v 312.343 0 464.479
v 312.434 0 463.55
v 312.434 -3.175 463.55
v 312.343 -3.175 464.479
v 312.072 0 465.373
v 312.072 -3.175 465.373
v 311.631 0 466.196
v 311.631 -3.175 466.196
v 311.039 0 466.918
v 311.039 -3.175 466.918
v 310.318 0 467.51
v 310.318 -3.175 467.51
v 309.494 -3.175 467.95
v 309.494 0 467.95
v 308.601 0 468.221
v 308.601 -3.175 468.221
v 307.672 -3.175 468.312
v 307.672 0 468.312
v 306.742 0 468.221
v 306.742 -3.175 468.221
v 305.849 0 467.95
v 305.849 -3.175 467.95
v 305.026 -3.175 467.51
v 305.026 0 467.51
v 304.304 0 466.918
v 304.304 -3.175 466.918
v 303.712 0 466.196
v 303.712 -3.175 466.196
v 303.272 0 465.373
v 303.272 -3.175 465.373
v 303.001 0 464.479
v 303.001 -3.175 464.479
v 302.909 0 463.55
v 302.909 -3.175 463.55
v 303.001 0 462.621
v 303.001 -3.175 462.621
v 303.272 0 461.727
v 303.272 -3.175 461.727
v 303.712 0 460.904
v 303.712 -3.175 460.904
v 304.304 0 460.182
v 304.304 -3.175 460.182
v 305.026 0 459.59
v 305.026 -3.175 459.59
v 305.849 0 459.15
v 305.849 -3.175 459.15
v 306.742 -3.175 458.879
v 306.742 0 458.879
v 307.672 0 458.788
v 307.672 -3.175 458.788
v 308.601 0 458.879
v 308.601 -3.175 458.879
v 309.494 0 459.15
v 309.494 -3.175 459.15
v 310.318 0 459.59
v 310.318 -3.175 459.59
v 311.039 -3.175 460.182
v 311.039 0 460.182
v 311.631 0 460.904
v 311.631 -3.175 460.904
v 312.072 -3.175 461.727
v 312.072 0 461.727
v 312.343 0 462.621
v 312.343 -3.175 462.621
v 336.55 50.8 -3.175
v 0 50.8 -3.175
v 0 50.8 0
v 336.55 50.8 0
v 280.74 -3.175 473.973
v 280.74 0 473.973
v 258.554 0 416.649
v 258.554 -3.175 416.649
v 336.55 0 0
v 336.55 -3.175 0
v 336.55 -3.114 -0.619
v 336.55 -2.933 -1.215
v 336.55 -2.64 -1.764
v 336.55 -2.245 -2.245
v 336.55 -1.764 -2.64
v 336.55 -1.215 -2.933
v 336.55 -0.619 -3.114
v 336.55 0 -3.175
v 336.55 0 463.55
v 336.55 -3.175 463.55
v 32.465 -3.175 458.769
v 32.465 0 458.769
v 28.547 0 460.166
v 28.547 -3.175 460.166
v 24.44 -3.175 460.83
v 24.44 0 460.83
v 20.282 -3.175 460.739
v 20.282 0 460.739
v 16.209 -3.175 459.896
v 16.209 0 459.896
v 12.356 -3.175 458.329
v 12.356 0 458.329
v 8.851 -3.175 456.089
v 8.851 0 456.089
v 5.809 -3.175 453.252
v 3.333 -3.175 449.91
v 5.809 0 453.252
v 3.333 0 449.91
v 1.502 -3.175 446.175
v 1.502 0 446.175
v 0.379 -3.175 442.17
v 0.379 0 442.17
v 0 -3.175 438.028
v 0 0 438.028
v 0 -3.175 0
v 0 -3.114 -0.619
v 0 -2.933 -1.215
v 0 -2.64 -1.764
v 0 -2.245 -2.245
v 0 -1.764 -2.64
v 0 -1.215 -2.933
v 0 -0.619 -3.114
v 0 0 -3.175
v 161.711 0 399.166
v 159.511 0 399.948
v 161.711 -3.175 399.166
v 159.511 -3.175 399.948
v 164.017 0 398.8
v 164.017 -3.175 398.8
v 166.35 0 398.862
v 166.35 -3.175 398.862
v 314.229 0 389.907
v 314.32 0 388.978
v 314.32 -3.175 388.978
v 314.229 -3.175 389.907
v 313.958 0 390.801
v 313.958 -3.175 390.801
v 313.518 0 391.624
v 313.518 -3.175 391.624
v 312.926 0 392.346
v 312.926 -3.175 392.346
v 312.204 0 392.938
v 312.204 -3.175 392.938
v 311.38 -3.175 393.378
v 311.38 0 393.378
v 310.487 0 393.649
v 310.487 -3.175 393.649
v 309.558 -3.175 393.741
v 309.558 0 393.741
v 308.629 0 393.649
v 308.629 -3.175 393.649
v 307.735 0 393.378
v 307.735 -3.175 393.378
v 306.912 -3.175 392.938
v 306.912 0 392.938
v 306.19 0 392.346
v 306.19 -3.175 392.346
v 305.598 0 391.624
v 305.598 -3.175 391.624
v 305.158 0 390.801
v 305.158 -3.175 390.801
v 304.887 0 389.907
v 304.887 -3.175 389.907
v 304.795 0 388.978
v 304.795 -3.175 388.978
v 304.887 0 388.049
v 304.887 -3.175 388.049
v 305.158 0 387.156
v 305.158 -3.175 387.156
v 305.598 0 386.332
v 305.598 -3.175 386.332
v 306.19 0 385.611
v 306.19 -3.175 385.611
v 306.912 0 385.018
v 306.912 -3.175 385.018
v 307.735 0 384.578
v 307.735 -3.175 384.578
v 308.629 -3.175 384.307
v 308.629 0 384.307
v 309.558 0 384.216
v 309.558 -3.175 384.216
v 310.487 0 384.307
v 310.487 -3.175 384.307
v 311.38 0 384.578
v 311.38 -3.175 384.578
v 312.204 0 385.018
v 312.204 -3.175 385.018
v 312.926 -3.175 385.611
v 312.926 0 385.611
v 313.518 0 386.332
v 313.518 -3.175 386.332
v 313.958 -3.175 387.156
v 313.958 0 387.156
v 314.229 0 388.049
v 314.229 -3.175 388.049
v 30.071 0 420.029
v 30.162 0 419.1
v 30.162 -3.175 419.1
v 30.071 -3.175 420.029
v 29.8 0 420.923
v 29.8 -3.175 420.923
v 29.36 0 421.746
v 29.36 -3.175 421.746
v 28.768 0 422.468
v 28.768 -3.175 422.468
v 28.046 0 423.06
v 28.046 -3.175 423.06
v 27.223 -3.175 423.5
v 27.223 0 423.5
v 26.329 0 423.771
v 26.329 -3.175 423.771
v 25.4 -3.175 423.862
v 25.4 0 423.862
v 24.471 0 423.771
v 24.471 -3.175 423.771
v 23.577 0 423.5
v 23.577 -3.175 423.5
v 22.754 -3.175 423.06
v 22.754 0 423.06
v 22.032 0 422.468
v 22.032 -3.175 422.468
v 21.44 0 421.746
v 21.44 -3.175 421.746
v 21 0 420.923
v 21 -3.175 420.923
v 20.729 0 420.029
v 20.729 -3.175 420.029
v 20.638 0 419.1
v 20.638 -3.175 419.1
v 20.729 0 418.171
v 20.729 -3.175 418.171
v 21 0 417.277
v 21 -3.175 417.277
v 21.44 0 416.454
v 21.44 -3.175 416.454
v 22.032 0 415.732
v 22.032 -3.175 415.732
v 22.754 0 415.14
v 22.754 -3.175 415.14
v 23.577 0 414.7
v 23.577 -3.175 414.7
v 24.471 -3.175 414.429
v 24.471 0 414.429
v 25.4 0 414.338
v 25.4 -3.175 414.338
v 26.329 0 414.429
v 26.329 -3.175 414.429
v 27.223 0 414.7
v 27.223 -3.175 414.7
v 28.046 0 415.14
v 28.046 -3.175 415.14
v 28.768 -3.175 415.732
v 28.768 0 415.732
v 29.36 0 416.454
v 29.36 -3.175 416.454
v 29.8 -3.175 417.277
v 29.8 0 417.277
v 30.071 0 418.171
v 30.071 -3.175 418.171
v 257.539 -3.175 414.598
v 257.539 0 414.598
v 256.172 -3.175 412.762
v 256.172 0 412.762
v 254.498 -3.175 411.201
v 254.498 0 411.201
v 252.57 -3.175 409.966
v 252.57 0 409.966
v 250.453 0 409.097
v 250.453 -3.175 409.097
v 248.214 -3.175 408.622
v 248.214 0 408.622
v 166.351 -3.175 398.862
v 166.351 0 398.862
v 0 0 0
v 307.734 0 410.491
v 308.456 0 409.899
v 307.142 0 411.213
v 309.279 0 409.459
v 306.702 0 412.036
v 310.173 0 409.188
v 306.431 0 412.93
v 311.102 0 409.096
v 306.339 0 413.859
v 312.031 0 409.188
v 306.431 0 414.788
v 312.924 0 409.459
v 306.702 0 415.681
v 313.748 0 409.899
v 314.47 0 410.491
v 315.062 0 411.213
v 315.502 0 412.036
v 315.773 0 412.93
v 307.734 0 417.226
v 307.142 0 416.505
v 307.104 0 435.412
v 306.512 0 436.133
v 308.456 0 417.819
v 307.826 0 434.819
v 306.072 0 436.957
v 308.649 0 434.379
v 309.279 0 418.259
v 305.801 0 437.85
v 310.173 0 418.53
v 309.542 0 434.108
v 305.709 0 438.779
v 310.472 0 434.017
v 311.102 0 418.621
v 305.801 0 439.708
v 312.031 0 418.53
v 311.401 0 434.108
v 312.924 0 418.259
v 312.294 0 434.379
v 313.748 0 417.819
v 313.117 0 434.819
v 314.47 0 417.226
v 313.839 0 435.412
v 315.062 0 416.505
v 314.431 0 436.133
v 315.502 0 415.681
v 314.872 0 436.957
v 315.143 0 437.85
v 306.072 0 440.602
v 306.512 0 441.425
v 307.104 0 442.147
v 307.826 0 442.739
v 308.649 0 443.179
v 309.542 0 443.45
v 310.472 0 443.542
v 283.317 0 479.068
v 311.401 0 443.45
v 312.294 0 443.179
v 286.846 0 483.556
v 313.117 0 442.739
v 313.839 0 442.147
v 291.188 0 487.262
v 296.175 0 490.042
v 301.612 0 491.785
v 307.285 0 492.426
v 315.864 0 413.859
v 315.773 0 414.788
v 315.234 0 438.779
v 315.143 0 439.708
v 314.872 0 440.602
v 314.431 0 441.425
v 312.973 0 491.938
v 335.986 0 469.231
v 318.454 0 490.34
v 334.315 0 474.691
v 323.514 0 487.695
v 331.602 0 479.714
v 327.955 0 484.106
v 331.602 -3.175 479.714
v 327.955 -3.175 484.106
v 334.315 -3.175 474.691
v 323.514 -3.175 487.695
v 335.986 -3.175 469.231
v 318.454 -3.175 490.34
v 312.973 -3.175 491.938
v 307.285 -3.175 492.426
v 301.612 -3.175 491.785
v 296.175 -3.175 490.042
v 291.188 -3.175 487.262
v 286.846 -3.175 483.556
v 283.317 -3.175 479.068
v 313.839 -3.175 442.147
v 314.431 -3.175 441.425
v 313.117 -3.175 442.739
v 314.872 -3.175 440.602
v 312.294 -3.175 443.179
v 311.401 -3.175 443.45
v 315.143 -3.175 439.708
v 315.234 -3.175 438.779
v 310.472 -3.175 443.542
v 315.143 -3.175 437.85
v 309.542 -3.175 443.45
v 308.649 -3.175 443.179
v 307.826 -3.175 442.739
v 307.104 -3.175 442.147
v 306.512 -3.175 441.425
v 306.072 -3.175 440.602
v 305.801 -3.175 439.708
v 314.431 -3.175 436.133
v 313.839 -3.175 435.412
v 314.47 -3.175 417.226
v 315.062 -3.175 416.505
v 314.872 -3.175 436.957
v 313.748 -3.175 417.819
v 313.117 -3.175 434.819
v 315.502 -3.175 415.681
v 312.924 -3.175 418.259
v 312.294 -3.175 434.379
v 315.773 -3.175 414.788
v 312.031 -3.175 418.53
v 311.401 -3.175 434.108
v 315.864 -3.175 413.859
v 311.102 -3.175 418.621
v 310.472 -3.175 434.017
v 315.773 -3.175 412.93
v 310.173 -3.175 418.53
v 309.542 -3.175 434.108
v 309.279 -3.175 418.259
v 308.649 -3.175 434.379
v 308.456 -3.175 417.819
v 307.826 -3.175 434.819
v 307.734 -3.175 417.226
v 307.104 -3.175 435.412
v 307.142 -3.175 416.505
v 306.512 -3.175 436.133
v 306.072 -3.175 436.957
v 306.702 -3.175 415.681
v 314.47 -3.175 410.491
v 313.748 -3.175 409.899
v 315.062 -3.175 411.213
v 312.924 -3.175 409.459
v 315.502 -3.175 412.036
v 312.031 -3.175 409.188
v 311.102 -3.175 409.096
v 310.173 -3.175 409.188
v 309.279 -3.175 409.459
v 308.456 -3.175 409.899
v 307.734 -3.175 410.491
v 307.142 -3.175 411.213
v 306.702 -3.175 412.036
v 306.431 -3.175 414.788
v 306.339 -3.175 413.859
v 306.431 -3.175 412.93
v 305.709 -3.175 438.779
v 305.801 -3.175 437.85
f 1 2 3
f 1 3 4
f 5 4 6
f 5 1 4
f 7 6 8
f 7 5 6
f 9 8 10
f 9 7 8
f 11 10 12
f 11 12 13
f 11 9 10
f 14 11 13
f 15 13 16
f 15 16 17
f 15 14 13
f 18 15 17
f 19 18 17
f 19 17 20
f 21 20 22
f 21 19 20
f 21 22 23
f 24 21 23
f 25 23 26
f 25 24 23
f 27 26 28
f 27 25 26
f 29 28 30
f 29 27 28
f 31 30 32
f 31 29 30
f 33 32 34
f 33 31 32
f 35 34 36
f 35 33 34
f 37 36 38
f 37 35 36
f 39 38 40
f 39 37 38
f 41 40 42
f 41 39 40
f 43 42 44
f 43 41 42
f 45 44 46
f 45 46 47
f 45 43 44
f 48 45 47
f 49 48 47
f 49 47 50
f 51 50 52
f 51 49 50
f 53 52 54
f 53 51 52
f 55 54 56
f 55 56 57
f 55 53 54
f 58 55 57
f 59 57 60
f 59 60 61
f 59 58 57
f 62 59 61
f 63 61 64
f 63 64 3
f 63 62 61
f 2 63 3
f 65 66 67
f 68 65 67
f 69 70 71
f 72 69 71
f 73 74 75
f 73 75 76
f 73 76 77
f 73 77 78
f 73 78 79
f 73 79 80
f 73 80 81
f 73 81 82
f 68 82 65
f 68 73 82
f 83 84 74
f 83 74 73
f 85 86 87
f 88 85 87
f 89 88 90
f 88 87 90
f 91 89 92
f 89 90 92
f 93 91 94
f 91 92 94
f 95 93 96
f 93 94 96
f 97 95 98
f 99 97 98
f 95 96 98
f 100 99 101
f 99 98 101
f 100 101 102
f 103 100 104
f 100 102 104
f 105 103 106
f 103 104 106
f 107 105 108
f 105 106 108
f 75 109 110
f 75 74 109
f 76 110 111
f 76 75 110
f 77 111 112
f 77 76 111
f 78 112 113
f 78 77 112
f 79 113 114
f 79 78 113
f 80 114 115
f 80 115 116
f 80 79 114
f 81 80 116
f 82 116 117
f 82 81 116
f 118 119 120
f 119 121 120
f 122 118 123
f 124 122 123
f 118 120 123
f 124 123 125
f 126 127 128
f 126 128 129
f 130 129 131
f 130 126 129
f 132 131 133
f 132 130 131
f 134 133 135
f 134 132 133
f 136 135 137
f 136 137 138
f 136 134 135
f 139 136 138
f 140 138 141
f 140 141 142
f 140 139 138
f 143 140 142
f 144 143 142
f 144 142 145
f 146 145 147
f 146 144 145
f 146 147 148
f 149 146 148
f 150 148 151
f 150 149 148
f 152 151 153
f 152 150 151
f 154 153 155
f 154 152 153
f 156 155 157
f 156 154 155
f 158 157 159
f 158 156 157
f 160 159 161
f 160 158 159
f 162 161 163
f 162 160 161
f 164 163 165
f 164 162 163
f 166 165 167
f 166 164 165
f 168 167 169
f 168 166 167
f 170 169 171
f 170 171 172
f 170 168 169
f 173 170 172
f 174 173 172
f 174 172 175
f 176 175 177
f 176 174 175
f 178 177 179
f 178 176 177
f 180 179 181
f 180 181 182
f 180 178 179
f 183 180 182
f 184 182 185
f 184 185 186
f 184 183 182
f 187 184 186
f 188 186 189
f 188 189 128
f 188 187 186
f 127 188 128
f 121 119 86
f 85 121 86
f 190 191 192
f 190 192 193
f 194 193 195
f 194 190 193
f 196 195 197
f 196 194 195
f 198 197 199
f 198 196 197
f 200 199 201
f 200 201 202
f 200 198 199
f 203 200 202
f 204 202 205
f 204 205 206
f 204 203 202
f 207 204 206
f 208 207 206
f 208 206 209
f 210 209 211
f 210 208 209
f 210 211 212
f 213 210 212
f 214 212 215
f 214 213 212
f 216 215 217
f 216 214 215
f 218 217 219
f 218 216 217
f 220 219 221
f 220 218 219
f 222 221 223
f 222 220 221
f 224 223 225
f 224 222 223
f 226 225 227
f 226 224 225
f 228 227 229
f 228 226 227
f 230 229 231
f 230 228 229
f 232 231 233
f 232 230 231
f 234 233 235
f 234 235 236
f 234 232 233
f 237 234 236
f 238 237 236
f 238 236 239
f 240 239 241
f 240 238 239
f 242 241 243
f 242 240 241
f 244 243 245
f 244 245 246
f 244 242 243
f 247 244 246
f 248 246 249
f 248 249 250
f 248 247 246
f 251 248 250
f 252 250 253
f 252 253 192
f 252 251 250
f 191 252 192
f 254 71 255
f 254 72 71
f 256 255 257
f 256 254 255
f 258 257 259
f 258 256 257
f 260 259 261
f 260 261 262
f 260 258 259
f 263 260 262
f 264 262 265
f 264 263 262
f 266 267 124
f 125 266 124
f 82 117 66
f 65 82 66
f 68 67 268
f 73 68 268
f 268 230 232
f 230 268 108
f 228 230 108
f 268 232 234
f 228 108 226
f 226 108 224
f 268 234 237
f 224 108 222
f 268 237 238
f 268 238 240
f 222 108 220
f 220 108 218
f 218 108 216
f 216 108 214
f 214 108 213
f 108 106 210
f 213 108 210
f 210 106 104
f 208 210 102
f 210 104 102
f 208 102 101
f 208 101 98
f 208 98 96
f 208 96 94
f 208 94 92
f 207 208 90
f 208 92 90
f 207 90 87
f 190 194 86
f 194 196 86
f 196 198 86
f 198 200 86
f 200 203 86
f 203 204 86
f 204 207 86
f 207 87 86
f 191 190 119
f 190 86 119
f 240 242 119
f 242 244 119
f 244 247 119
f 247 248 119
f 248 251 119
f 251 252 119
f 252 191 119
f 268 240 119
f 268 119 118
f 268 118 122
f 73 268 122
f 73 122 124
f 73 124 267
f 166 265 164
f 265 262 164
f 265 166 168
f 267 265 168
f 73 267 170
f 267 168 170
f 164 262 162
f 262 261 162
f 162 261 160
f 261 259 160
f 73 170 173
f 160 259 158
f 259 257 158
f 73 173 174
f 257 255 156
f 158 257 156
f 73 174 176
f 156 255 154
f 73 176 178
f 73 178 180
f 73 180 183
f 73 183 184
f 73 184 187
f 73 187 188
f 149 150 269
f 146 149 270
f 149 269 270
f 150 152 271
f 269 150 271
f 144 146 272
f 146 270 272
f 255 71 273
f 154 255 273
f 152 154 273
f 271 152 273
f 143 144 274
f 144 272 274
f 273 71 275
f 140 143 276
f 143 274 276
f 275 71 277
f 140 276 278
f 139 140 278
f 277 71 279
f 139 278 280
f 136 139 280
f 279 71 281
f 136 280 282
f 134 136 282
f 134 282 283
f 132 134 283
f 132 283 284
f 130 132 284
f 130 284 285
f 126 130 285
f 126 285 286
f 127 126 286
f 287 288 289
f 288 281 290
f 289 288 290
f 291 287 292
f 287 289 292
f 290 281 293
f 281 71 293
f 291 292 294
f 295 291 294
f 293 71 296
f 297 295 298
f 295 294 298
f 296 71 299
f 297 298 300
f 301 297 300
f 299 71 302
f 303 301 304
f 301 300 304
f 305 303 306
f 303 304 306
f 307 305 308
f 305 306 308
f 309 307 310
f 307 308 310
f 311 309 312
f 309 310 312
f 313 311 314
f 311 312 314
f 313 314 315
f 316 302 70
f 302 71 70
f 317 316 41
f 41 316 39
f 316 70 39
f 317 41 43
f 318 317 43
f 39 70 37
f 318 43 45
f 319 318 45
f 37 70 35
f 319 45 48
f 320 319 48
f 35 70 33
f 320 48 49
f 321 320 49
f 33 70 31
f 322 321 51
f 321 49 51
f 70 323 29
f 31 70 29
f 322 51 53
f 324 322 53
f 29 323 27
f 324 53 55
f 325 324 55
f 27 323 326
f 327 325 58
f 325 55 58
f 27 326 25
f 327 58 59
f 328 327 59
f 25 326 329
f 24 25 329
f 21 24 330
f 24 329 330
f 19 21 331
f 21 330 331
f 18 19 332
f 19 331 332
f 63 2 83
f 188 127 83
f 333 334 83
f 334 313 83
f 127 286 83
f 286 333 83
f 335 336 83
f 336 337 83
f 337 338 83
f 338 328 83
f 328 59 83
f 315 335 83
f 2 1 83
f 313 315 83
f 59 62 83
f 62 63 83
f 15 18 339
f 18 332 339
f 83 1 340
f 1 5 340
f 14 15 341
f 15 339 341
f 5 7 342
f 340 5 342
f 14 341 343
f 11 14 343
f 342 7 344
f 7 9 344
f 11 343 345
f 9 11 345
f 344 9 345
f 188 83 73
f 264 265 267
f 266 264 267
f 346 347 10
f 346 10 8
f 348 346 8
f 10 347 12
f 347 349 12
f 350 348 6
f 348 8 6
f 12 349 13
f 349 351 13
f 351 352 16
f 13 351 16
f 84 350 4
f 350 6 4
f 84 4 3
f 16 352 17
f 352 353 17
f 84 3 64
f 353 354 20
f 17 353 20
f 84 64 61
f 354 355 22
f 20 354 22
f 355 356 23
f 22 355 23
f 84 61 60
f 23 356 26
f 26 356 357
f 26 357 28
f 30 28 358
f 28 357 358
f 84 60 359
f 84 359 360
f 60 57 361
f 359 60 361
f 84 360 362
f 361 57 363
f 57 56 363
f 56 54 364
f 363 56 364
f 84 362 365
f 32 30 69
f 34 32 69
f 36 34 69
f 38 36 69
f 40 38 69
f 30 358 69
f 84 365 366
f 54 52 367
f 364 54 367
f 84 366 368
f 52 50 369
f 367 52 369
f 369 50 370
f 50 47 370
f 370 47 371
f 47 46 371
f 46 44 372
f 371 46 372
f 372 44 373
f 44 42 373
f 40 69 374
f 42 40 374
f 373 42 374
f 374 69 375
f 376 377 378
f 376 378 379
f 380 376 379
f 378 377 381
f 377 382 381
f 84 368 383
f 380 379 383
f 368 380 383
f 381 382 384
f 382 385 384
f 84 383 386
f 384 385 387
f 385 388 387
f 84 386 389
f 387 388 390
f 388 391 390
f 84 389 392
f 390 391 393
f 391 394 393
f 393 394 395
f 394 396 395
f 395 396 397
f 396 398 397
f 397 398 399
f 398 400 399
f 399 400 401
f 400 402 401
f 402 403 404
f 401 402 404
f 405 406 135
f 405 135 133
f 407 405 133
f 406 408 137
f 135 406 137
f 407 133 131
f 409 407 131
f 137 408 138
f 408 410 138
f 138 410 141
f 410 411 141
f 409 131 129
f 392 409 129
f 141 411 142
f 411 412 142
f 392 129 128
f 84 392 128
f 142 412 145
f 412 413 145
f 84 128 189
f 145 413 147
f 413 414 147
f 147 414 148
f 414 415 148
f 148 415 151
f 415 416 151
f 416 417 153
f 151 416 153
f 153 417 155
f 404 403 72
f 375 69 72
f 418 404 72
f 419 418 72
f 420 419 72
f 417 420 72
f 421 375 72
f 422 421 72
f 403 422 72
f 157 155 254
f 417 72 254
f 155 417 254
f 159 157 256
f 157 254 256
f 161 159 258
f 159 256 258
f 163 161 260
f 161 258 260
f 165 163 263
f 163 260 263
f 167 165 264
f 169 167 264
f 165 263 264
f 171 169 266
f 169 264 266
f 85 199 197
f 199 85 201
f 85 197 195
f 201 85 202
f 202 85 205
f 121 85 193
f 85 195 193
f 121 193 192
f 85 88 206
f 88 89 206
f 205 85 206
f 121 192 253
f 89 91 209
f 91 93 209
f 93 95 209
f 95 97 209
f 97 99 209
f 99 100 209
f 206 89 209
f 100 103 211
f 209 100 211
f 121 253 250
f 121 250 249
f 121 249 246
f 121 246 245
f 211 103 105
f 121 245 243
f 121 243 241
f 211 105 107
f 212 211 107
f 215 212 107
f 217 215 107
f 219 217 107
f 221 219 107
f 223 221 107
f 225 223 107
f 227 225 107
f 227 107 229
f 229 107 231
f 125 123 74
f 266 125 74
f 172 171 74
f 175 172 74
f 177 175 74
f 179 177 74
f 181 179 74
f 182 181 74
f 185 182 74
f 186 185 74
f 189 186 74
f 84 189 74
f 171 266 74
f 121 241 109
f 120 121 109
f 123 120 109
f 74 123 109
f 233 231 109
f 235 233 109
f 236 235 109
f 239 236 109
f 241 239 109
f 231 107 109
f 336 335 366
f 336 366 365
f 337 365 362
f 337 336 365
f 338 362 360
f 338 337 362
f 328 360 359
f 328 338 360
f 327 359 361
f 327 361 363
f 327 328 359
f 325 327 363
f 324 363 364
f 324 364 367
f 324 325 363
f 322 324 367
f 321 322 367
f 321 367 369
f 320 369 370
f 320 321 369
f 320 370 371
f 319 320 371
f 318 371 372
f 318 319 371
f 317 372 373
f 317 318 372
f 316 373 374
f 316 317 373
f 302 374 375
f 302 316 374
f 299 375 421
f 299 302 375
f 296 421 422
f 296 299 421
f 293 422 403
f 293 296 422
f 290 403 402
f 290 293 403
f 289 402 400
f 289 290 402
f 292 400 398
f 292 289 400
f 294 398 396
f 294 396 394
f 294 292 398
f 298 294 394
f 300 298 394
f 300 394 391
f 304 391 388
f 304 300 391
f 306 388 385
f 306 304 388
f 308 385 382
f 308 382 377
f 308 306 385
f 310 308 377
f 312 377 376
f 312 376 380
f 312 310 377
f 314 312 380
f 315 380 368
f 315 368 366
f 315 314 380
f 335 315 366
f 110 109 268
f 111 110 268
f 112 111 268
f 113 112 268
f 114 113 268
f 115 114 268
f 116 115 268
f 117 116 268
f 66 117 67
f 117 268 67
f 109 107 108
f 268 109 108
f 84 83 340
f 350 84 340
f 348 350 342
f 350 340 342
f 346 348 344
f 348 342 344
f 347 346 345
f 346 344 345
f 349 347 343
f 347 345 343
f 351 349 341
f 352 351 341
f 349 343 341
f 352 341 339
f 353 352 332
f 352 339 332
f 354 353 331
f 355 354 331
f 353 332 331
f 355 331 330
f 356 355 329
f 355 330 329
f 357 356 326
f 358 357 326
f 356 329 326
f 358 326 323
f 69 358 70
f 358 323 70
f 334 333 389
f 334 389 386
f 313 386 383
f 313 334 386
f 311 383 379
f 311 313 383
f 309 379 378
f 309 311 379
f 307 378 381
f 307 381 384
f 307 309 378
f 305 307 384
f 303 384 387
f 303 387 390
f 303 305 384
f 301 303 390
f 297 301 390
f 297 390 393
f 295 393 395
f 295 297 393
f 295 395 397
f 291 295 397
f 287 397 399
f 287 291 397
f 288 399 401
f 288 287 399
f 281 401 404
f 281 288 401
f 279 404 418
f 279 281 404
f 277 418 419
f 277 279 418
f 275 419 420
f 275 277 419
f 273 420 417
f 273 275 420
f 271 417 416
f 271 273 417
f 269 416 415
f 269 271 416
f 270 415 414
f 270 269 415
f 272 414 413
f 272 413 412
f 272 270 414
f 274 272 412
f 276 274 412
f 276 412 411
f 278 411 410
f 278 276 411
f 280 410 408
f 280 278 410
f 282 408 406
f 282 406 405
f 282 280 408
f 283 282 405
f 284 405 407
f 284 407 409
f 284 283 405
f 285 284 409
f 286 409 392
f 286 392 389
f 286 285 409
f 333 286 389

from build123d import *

# Parameters (mm, degrees)
F1_R     = 4.7625
F2_DEPTH = 3.175
F3_R     = 12.7
F5_DEPTH = 336.55
F6_R     = 3.175


with BuildPart() as f2:
    # F1 (on Front) → F2 (new body)
    with BuildSketch(Plane.XZ):
        with BuildLine():
            Line((0, 438.028063), (0, 0))
            Line((0, 0), (336.55, 0))
            Line((336.55, 0), (336.55, 463.55))
            ThreePointArc((336.55, 463.55), (312.97337, 491.937548), (280.739907, 473.973298))
            Line((280.739907, 473.973298), (255.797312, 409.526661))
            Line((255.797312, 409.526661), (166.350515, 398.862006))
            Line((166.350515, 398.862006), (162.776801, 398.435916))
            Line((162.776801, 398.435916), (159.510839, 399.948027))
            Line((159.510839, 399.948027), (32.464507, 458.769359))
            ThreePointArc((32.464507, 458.769359), (10.552386, 457.288903), (0, 438.028063))
        make_face()
        with Locations((25.4, 419.1)):
            Circle(F1_R, mode=Mode.SUBTRACT)
        with Locations((309.557942, 388.978135)):
            Circle(F1_R, mode=Mode.SUBTRACT)
        with Locations((311.101928, 413.858754)):
            Circle(F1_R, mode=Mode.SUBTRACT)
        with Locations((310.471551, 438.779263)):
            Circle(F1_R, mode=Mode.SUBTRACT)
        with Locations((307.671607, 463.55)):
            Circle(F1_R, mode=Mode.SUBTRACT)
    extrude(amount=F2_DEPTH)

    # F3
    f3_edges = [f2.edges().sort_by_distance(p)[0] for p in [
        (162.776801, -1.5875, 398.435916),
        (255.797312, -1.5875, 409.526661),
    ]]
    fillet(f3_edges, radius=F3_R)

    # F4 (on Right) → F5 (join, through all)
    with BuildSketch(Plane.YZ):
        Polygon((0, 0), (-3.175, 0), (-3.175, -3.175), (50.8, -3.175), (50.8, 0), align=None)
    extrude(amount=F5_DEPTH)

    # F6
    f6_edges = [f2.edges().sort_by_distance(p)[0] for p in [
        (168.275, -3.175, -3.175),
    ]]
    fillet(f6_edges, radius=F6_R)


solid = f2.part
